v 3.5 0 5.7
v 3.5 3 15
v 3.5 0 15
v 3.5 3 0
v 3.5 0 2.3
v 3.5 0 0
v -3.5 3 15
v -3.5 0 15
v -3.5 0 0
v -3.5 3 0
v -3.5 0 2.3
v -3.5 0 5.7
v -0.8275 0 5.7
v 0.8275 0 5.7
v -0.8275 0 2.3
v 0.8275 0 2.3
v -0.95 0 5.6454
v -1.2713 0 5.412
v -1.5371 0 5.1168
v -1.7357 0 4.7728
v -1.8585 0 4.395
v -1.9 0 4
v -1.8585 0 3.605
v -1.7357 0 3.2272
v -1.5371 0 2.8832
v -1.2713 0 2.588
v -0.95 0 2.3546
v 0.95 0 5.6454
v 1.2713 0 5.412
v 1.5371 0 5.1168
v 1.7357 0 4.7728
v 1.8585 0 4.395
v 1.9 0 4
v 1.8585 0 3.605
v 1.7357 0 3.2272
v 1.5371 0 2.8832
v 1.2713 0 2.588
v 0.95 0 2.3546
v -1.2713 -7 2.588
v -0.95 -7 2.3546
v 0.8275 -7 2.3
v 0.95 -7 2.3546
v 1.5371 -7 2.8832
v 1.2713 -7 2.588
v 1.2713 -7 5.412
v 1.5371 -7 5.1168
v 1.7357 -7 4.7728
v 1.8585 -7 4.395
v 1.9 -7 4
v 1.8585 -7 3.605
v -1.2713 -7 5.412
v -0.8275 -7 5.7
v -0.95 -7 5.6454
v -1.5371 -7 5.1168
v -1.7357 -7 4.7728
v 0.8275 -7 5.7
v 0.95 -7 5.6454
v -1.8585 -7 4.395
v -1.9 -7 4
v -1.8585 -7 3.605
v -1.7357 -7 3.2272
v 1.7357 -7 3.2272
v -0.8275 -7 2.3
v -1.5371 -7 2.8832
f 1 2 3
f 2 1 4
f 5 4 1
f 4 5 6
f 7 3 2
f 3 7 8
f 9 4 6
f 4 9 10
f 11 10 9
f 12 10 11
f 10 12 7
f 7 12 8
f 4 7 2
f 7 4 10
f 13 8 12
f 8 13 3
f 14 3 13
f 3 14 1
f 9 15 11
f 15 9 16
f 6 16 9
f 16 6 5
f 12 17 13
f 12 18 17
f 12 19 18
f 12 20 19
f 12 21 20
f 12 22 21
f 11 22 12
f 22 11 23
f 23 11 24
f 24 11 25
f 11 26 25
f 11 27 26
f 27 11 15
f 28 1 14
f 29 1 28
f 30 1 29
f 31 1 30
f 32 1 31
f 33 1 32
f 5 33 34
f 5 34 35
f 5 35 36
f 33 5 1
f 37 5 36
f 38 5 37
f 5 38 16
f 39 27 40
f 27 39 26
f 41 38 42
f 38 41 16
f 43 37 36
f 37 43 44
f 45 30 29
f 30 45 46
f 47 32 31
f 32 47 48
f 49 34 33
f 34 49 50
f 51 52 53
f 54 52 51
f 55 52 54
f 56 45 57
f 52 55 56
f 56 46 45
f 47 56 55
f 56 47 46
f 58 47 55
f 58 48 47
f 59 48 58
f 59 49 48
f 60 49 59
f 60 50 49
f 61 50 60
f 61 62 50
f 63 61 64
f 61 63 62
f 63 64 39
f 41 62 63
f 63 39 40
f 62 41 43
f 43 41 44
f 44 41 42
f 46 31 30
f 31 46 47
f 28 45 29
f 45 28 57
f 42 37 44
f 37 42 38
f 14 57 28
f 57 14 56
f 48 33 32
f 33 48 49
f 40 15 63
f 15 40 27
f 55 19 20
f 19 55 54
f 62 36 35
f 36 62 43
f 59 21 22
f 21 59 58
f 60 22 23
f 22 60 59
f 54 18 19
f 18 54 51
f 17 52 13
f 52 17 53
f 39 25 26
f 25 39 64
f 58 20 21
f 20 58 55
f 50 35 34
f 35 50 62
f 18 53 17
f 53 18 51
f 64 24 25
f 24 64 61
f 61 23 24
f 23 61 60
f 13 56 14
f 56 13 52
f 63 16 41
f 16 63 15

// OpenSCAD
difference(){
	union(){        
        translate([-3.5,0,0]){
           cube([7,3,15], center=false);
        }

        translate([0,3,4]){
            rotate(a = [90,0,0]) {
                cylinder(h=10, r=1.9, $fn=30, center=false);
            }
        }


        
	}
	union() {


        translate([-10,-10,5.7]){
           cube([20,10,10], center=false);
        }

        translate([-10,-10,-7.7]){
           cube([20,10,10], center=false);
        }
	


	}
}
